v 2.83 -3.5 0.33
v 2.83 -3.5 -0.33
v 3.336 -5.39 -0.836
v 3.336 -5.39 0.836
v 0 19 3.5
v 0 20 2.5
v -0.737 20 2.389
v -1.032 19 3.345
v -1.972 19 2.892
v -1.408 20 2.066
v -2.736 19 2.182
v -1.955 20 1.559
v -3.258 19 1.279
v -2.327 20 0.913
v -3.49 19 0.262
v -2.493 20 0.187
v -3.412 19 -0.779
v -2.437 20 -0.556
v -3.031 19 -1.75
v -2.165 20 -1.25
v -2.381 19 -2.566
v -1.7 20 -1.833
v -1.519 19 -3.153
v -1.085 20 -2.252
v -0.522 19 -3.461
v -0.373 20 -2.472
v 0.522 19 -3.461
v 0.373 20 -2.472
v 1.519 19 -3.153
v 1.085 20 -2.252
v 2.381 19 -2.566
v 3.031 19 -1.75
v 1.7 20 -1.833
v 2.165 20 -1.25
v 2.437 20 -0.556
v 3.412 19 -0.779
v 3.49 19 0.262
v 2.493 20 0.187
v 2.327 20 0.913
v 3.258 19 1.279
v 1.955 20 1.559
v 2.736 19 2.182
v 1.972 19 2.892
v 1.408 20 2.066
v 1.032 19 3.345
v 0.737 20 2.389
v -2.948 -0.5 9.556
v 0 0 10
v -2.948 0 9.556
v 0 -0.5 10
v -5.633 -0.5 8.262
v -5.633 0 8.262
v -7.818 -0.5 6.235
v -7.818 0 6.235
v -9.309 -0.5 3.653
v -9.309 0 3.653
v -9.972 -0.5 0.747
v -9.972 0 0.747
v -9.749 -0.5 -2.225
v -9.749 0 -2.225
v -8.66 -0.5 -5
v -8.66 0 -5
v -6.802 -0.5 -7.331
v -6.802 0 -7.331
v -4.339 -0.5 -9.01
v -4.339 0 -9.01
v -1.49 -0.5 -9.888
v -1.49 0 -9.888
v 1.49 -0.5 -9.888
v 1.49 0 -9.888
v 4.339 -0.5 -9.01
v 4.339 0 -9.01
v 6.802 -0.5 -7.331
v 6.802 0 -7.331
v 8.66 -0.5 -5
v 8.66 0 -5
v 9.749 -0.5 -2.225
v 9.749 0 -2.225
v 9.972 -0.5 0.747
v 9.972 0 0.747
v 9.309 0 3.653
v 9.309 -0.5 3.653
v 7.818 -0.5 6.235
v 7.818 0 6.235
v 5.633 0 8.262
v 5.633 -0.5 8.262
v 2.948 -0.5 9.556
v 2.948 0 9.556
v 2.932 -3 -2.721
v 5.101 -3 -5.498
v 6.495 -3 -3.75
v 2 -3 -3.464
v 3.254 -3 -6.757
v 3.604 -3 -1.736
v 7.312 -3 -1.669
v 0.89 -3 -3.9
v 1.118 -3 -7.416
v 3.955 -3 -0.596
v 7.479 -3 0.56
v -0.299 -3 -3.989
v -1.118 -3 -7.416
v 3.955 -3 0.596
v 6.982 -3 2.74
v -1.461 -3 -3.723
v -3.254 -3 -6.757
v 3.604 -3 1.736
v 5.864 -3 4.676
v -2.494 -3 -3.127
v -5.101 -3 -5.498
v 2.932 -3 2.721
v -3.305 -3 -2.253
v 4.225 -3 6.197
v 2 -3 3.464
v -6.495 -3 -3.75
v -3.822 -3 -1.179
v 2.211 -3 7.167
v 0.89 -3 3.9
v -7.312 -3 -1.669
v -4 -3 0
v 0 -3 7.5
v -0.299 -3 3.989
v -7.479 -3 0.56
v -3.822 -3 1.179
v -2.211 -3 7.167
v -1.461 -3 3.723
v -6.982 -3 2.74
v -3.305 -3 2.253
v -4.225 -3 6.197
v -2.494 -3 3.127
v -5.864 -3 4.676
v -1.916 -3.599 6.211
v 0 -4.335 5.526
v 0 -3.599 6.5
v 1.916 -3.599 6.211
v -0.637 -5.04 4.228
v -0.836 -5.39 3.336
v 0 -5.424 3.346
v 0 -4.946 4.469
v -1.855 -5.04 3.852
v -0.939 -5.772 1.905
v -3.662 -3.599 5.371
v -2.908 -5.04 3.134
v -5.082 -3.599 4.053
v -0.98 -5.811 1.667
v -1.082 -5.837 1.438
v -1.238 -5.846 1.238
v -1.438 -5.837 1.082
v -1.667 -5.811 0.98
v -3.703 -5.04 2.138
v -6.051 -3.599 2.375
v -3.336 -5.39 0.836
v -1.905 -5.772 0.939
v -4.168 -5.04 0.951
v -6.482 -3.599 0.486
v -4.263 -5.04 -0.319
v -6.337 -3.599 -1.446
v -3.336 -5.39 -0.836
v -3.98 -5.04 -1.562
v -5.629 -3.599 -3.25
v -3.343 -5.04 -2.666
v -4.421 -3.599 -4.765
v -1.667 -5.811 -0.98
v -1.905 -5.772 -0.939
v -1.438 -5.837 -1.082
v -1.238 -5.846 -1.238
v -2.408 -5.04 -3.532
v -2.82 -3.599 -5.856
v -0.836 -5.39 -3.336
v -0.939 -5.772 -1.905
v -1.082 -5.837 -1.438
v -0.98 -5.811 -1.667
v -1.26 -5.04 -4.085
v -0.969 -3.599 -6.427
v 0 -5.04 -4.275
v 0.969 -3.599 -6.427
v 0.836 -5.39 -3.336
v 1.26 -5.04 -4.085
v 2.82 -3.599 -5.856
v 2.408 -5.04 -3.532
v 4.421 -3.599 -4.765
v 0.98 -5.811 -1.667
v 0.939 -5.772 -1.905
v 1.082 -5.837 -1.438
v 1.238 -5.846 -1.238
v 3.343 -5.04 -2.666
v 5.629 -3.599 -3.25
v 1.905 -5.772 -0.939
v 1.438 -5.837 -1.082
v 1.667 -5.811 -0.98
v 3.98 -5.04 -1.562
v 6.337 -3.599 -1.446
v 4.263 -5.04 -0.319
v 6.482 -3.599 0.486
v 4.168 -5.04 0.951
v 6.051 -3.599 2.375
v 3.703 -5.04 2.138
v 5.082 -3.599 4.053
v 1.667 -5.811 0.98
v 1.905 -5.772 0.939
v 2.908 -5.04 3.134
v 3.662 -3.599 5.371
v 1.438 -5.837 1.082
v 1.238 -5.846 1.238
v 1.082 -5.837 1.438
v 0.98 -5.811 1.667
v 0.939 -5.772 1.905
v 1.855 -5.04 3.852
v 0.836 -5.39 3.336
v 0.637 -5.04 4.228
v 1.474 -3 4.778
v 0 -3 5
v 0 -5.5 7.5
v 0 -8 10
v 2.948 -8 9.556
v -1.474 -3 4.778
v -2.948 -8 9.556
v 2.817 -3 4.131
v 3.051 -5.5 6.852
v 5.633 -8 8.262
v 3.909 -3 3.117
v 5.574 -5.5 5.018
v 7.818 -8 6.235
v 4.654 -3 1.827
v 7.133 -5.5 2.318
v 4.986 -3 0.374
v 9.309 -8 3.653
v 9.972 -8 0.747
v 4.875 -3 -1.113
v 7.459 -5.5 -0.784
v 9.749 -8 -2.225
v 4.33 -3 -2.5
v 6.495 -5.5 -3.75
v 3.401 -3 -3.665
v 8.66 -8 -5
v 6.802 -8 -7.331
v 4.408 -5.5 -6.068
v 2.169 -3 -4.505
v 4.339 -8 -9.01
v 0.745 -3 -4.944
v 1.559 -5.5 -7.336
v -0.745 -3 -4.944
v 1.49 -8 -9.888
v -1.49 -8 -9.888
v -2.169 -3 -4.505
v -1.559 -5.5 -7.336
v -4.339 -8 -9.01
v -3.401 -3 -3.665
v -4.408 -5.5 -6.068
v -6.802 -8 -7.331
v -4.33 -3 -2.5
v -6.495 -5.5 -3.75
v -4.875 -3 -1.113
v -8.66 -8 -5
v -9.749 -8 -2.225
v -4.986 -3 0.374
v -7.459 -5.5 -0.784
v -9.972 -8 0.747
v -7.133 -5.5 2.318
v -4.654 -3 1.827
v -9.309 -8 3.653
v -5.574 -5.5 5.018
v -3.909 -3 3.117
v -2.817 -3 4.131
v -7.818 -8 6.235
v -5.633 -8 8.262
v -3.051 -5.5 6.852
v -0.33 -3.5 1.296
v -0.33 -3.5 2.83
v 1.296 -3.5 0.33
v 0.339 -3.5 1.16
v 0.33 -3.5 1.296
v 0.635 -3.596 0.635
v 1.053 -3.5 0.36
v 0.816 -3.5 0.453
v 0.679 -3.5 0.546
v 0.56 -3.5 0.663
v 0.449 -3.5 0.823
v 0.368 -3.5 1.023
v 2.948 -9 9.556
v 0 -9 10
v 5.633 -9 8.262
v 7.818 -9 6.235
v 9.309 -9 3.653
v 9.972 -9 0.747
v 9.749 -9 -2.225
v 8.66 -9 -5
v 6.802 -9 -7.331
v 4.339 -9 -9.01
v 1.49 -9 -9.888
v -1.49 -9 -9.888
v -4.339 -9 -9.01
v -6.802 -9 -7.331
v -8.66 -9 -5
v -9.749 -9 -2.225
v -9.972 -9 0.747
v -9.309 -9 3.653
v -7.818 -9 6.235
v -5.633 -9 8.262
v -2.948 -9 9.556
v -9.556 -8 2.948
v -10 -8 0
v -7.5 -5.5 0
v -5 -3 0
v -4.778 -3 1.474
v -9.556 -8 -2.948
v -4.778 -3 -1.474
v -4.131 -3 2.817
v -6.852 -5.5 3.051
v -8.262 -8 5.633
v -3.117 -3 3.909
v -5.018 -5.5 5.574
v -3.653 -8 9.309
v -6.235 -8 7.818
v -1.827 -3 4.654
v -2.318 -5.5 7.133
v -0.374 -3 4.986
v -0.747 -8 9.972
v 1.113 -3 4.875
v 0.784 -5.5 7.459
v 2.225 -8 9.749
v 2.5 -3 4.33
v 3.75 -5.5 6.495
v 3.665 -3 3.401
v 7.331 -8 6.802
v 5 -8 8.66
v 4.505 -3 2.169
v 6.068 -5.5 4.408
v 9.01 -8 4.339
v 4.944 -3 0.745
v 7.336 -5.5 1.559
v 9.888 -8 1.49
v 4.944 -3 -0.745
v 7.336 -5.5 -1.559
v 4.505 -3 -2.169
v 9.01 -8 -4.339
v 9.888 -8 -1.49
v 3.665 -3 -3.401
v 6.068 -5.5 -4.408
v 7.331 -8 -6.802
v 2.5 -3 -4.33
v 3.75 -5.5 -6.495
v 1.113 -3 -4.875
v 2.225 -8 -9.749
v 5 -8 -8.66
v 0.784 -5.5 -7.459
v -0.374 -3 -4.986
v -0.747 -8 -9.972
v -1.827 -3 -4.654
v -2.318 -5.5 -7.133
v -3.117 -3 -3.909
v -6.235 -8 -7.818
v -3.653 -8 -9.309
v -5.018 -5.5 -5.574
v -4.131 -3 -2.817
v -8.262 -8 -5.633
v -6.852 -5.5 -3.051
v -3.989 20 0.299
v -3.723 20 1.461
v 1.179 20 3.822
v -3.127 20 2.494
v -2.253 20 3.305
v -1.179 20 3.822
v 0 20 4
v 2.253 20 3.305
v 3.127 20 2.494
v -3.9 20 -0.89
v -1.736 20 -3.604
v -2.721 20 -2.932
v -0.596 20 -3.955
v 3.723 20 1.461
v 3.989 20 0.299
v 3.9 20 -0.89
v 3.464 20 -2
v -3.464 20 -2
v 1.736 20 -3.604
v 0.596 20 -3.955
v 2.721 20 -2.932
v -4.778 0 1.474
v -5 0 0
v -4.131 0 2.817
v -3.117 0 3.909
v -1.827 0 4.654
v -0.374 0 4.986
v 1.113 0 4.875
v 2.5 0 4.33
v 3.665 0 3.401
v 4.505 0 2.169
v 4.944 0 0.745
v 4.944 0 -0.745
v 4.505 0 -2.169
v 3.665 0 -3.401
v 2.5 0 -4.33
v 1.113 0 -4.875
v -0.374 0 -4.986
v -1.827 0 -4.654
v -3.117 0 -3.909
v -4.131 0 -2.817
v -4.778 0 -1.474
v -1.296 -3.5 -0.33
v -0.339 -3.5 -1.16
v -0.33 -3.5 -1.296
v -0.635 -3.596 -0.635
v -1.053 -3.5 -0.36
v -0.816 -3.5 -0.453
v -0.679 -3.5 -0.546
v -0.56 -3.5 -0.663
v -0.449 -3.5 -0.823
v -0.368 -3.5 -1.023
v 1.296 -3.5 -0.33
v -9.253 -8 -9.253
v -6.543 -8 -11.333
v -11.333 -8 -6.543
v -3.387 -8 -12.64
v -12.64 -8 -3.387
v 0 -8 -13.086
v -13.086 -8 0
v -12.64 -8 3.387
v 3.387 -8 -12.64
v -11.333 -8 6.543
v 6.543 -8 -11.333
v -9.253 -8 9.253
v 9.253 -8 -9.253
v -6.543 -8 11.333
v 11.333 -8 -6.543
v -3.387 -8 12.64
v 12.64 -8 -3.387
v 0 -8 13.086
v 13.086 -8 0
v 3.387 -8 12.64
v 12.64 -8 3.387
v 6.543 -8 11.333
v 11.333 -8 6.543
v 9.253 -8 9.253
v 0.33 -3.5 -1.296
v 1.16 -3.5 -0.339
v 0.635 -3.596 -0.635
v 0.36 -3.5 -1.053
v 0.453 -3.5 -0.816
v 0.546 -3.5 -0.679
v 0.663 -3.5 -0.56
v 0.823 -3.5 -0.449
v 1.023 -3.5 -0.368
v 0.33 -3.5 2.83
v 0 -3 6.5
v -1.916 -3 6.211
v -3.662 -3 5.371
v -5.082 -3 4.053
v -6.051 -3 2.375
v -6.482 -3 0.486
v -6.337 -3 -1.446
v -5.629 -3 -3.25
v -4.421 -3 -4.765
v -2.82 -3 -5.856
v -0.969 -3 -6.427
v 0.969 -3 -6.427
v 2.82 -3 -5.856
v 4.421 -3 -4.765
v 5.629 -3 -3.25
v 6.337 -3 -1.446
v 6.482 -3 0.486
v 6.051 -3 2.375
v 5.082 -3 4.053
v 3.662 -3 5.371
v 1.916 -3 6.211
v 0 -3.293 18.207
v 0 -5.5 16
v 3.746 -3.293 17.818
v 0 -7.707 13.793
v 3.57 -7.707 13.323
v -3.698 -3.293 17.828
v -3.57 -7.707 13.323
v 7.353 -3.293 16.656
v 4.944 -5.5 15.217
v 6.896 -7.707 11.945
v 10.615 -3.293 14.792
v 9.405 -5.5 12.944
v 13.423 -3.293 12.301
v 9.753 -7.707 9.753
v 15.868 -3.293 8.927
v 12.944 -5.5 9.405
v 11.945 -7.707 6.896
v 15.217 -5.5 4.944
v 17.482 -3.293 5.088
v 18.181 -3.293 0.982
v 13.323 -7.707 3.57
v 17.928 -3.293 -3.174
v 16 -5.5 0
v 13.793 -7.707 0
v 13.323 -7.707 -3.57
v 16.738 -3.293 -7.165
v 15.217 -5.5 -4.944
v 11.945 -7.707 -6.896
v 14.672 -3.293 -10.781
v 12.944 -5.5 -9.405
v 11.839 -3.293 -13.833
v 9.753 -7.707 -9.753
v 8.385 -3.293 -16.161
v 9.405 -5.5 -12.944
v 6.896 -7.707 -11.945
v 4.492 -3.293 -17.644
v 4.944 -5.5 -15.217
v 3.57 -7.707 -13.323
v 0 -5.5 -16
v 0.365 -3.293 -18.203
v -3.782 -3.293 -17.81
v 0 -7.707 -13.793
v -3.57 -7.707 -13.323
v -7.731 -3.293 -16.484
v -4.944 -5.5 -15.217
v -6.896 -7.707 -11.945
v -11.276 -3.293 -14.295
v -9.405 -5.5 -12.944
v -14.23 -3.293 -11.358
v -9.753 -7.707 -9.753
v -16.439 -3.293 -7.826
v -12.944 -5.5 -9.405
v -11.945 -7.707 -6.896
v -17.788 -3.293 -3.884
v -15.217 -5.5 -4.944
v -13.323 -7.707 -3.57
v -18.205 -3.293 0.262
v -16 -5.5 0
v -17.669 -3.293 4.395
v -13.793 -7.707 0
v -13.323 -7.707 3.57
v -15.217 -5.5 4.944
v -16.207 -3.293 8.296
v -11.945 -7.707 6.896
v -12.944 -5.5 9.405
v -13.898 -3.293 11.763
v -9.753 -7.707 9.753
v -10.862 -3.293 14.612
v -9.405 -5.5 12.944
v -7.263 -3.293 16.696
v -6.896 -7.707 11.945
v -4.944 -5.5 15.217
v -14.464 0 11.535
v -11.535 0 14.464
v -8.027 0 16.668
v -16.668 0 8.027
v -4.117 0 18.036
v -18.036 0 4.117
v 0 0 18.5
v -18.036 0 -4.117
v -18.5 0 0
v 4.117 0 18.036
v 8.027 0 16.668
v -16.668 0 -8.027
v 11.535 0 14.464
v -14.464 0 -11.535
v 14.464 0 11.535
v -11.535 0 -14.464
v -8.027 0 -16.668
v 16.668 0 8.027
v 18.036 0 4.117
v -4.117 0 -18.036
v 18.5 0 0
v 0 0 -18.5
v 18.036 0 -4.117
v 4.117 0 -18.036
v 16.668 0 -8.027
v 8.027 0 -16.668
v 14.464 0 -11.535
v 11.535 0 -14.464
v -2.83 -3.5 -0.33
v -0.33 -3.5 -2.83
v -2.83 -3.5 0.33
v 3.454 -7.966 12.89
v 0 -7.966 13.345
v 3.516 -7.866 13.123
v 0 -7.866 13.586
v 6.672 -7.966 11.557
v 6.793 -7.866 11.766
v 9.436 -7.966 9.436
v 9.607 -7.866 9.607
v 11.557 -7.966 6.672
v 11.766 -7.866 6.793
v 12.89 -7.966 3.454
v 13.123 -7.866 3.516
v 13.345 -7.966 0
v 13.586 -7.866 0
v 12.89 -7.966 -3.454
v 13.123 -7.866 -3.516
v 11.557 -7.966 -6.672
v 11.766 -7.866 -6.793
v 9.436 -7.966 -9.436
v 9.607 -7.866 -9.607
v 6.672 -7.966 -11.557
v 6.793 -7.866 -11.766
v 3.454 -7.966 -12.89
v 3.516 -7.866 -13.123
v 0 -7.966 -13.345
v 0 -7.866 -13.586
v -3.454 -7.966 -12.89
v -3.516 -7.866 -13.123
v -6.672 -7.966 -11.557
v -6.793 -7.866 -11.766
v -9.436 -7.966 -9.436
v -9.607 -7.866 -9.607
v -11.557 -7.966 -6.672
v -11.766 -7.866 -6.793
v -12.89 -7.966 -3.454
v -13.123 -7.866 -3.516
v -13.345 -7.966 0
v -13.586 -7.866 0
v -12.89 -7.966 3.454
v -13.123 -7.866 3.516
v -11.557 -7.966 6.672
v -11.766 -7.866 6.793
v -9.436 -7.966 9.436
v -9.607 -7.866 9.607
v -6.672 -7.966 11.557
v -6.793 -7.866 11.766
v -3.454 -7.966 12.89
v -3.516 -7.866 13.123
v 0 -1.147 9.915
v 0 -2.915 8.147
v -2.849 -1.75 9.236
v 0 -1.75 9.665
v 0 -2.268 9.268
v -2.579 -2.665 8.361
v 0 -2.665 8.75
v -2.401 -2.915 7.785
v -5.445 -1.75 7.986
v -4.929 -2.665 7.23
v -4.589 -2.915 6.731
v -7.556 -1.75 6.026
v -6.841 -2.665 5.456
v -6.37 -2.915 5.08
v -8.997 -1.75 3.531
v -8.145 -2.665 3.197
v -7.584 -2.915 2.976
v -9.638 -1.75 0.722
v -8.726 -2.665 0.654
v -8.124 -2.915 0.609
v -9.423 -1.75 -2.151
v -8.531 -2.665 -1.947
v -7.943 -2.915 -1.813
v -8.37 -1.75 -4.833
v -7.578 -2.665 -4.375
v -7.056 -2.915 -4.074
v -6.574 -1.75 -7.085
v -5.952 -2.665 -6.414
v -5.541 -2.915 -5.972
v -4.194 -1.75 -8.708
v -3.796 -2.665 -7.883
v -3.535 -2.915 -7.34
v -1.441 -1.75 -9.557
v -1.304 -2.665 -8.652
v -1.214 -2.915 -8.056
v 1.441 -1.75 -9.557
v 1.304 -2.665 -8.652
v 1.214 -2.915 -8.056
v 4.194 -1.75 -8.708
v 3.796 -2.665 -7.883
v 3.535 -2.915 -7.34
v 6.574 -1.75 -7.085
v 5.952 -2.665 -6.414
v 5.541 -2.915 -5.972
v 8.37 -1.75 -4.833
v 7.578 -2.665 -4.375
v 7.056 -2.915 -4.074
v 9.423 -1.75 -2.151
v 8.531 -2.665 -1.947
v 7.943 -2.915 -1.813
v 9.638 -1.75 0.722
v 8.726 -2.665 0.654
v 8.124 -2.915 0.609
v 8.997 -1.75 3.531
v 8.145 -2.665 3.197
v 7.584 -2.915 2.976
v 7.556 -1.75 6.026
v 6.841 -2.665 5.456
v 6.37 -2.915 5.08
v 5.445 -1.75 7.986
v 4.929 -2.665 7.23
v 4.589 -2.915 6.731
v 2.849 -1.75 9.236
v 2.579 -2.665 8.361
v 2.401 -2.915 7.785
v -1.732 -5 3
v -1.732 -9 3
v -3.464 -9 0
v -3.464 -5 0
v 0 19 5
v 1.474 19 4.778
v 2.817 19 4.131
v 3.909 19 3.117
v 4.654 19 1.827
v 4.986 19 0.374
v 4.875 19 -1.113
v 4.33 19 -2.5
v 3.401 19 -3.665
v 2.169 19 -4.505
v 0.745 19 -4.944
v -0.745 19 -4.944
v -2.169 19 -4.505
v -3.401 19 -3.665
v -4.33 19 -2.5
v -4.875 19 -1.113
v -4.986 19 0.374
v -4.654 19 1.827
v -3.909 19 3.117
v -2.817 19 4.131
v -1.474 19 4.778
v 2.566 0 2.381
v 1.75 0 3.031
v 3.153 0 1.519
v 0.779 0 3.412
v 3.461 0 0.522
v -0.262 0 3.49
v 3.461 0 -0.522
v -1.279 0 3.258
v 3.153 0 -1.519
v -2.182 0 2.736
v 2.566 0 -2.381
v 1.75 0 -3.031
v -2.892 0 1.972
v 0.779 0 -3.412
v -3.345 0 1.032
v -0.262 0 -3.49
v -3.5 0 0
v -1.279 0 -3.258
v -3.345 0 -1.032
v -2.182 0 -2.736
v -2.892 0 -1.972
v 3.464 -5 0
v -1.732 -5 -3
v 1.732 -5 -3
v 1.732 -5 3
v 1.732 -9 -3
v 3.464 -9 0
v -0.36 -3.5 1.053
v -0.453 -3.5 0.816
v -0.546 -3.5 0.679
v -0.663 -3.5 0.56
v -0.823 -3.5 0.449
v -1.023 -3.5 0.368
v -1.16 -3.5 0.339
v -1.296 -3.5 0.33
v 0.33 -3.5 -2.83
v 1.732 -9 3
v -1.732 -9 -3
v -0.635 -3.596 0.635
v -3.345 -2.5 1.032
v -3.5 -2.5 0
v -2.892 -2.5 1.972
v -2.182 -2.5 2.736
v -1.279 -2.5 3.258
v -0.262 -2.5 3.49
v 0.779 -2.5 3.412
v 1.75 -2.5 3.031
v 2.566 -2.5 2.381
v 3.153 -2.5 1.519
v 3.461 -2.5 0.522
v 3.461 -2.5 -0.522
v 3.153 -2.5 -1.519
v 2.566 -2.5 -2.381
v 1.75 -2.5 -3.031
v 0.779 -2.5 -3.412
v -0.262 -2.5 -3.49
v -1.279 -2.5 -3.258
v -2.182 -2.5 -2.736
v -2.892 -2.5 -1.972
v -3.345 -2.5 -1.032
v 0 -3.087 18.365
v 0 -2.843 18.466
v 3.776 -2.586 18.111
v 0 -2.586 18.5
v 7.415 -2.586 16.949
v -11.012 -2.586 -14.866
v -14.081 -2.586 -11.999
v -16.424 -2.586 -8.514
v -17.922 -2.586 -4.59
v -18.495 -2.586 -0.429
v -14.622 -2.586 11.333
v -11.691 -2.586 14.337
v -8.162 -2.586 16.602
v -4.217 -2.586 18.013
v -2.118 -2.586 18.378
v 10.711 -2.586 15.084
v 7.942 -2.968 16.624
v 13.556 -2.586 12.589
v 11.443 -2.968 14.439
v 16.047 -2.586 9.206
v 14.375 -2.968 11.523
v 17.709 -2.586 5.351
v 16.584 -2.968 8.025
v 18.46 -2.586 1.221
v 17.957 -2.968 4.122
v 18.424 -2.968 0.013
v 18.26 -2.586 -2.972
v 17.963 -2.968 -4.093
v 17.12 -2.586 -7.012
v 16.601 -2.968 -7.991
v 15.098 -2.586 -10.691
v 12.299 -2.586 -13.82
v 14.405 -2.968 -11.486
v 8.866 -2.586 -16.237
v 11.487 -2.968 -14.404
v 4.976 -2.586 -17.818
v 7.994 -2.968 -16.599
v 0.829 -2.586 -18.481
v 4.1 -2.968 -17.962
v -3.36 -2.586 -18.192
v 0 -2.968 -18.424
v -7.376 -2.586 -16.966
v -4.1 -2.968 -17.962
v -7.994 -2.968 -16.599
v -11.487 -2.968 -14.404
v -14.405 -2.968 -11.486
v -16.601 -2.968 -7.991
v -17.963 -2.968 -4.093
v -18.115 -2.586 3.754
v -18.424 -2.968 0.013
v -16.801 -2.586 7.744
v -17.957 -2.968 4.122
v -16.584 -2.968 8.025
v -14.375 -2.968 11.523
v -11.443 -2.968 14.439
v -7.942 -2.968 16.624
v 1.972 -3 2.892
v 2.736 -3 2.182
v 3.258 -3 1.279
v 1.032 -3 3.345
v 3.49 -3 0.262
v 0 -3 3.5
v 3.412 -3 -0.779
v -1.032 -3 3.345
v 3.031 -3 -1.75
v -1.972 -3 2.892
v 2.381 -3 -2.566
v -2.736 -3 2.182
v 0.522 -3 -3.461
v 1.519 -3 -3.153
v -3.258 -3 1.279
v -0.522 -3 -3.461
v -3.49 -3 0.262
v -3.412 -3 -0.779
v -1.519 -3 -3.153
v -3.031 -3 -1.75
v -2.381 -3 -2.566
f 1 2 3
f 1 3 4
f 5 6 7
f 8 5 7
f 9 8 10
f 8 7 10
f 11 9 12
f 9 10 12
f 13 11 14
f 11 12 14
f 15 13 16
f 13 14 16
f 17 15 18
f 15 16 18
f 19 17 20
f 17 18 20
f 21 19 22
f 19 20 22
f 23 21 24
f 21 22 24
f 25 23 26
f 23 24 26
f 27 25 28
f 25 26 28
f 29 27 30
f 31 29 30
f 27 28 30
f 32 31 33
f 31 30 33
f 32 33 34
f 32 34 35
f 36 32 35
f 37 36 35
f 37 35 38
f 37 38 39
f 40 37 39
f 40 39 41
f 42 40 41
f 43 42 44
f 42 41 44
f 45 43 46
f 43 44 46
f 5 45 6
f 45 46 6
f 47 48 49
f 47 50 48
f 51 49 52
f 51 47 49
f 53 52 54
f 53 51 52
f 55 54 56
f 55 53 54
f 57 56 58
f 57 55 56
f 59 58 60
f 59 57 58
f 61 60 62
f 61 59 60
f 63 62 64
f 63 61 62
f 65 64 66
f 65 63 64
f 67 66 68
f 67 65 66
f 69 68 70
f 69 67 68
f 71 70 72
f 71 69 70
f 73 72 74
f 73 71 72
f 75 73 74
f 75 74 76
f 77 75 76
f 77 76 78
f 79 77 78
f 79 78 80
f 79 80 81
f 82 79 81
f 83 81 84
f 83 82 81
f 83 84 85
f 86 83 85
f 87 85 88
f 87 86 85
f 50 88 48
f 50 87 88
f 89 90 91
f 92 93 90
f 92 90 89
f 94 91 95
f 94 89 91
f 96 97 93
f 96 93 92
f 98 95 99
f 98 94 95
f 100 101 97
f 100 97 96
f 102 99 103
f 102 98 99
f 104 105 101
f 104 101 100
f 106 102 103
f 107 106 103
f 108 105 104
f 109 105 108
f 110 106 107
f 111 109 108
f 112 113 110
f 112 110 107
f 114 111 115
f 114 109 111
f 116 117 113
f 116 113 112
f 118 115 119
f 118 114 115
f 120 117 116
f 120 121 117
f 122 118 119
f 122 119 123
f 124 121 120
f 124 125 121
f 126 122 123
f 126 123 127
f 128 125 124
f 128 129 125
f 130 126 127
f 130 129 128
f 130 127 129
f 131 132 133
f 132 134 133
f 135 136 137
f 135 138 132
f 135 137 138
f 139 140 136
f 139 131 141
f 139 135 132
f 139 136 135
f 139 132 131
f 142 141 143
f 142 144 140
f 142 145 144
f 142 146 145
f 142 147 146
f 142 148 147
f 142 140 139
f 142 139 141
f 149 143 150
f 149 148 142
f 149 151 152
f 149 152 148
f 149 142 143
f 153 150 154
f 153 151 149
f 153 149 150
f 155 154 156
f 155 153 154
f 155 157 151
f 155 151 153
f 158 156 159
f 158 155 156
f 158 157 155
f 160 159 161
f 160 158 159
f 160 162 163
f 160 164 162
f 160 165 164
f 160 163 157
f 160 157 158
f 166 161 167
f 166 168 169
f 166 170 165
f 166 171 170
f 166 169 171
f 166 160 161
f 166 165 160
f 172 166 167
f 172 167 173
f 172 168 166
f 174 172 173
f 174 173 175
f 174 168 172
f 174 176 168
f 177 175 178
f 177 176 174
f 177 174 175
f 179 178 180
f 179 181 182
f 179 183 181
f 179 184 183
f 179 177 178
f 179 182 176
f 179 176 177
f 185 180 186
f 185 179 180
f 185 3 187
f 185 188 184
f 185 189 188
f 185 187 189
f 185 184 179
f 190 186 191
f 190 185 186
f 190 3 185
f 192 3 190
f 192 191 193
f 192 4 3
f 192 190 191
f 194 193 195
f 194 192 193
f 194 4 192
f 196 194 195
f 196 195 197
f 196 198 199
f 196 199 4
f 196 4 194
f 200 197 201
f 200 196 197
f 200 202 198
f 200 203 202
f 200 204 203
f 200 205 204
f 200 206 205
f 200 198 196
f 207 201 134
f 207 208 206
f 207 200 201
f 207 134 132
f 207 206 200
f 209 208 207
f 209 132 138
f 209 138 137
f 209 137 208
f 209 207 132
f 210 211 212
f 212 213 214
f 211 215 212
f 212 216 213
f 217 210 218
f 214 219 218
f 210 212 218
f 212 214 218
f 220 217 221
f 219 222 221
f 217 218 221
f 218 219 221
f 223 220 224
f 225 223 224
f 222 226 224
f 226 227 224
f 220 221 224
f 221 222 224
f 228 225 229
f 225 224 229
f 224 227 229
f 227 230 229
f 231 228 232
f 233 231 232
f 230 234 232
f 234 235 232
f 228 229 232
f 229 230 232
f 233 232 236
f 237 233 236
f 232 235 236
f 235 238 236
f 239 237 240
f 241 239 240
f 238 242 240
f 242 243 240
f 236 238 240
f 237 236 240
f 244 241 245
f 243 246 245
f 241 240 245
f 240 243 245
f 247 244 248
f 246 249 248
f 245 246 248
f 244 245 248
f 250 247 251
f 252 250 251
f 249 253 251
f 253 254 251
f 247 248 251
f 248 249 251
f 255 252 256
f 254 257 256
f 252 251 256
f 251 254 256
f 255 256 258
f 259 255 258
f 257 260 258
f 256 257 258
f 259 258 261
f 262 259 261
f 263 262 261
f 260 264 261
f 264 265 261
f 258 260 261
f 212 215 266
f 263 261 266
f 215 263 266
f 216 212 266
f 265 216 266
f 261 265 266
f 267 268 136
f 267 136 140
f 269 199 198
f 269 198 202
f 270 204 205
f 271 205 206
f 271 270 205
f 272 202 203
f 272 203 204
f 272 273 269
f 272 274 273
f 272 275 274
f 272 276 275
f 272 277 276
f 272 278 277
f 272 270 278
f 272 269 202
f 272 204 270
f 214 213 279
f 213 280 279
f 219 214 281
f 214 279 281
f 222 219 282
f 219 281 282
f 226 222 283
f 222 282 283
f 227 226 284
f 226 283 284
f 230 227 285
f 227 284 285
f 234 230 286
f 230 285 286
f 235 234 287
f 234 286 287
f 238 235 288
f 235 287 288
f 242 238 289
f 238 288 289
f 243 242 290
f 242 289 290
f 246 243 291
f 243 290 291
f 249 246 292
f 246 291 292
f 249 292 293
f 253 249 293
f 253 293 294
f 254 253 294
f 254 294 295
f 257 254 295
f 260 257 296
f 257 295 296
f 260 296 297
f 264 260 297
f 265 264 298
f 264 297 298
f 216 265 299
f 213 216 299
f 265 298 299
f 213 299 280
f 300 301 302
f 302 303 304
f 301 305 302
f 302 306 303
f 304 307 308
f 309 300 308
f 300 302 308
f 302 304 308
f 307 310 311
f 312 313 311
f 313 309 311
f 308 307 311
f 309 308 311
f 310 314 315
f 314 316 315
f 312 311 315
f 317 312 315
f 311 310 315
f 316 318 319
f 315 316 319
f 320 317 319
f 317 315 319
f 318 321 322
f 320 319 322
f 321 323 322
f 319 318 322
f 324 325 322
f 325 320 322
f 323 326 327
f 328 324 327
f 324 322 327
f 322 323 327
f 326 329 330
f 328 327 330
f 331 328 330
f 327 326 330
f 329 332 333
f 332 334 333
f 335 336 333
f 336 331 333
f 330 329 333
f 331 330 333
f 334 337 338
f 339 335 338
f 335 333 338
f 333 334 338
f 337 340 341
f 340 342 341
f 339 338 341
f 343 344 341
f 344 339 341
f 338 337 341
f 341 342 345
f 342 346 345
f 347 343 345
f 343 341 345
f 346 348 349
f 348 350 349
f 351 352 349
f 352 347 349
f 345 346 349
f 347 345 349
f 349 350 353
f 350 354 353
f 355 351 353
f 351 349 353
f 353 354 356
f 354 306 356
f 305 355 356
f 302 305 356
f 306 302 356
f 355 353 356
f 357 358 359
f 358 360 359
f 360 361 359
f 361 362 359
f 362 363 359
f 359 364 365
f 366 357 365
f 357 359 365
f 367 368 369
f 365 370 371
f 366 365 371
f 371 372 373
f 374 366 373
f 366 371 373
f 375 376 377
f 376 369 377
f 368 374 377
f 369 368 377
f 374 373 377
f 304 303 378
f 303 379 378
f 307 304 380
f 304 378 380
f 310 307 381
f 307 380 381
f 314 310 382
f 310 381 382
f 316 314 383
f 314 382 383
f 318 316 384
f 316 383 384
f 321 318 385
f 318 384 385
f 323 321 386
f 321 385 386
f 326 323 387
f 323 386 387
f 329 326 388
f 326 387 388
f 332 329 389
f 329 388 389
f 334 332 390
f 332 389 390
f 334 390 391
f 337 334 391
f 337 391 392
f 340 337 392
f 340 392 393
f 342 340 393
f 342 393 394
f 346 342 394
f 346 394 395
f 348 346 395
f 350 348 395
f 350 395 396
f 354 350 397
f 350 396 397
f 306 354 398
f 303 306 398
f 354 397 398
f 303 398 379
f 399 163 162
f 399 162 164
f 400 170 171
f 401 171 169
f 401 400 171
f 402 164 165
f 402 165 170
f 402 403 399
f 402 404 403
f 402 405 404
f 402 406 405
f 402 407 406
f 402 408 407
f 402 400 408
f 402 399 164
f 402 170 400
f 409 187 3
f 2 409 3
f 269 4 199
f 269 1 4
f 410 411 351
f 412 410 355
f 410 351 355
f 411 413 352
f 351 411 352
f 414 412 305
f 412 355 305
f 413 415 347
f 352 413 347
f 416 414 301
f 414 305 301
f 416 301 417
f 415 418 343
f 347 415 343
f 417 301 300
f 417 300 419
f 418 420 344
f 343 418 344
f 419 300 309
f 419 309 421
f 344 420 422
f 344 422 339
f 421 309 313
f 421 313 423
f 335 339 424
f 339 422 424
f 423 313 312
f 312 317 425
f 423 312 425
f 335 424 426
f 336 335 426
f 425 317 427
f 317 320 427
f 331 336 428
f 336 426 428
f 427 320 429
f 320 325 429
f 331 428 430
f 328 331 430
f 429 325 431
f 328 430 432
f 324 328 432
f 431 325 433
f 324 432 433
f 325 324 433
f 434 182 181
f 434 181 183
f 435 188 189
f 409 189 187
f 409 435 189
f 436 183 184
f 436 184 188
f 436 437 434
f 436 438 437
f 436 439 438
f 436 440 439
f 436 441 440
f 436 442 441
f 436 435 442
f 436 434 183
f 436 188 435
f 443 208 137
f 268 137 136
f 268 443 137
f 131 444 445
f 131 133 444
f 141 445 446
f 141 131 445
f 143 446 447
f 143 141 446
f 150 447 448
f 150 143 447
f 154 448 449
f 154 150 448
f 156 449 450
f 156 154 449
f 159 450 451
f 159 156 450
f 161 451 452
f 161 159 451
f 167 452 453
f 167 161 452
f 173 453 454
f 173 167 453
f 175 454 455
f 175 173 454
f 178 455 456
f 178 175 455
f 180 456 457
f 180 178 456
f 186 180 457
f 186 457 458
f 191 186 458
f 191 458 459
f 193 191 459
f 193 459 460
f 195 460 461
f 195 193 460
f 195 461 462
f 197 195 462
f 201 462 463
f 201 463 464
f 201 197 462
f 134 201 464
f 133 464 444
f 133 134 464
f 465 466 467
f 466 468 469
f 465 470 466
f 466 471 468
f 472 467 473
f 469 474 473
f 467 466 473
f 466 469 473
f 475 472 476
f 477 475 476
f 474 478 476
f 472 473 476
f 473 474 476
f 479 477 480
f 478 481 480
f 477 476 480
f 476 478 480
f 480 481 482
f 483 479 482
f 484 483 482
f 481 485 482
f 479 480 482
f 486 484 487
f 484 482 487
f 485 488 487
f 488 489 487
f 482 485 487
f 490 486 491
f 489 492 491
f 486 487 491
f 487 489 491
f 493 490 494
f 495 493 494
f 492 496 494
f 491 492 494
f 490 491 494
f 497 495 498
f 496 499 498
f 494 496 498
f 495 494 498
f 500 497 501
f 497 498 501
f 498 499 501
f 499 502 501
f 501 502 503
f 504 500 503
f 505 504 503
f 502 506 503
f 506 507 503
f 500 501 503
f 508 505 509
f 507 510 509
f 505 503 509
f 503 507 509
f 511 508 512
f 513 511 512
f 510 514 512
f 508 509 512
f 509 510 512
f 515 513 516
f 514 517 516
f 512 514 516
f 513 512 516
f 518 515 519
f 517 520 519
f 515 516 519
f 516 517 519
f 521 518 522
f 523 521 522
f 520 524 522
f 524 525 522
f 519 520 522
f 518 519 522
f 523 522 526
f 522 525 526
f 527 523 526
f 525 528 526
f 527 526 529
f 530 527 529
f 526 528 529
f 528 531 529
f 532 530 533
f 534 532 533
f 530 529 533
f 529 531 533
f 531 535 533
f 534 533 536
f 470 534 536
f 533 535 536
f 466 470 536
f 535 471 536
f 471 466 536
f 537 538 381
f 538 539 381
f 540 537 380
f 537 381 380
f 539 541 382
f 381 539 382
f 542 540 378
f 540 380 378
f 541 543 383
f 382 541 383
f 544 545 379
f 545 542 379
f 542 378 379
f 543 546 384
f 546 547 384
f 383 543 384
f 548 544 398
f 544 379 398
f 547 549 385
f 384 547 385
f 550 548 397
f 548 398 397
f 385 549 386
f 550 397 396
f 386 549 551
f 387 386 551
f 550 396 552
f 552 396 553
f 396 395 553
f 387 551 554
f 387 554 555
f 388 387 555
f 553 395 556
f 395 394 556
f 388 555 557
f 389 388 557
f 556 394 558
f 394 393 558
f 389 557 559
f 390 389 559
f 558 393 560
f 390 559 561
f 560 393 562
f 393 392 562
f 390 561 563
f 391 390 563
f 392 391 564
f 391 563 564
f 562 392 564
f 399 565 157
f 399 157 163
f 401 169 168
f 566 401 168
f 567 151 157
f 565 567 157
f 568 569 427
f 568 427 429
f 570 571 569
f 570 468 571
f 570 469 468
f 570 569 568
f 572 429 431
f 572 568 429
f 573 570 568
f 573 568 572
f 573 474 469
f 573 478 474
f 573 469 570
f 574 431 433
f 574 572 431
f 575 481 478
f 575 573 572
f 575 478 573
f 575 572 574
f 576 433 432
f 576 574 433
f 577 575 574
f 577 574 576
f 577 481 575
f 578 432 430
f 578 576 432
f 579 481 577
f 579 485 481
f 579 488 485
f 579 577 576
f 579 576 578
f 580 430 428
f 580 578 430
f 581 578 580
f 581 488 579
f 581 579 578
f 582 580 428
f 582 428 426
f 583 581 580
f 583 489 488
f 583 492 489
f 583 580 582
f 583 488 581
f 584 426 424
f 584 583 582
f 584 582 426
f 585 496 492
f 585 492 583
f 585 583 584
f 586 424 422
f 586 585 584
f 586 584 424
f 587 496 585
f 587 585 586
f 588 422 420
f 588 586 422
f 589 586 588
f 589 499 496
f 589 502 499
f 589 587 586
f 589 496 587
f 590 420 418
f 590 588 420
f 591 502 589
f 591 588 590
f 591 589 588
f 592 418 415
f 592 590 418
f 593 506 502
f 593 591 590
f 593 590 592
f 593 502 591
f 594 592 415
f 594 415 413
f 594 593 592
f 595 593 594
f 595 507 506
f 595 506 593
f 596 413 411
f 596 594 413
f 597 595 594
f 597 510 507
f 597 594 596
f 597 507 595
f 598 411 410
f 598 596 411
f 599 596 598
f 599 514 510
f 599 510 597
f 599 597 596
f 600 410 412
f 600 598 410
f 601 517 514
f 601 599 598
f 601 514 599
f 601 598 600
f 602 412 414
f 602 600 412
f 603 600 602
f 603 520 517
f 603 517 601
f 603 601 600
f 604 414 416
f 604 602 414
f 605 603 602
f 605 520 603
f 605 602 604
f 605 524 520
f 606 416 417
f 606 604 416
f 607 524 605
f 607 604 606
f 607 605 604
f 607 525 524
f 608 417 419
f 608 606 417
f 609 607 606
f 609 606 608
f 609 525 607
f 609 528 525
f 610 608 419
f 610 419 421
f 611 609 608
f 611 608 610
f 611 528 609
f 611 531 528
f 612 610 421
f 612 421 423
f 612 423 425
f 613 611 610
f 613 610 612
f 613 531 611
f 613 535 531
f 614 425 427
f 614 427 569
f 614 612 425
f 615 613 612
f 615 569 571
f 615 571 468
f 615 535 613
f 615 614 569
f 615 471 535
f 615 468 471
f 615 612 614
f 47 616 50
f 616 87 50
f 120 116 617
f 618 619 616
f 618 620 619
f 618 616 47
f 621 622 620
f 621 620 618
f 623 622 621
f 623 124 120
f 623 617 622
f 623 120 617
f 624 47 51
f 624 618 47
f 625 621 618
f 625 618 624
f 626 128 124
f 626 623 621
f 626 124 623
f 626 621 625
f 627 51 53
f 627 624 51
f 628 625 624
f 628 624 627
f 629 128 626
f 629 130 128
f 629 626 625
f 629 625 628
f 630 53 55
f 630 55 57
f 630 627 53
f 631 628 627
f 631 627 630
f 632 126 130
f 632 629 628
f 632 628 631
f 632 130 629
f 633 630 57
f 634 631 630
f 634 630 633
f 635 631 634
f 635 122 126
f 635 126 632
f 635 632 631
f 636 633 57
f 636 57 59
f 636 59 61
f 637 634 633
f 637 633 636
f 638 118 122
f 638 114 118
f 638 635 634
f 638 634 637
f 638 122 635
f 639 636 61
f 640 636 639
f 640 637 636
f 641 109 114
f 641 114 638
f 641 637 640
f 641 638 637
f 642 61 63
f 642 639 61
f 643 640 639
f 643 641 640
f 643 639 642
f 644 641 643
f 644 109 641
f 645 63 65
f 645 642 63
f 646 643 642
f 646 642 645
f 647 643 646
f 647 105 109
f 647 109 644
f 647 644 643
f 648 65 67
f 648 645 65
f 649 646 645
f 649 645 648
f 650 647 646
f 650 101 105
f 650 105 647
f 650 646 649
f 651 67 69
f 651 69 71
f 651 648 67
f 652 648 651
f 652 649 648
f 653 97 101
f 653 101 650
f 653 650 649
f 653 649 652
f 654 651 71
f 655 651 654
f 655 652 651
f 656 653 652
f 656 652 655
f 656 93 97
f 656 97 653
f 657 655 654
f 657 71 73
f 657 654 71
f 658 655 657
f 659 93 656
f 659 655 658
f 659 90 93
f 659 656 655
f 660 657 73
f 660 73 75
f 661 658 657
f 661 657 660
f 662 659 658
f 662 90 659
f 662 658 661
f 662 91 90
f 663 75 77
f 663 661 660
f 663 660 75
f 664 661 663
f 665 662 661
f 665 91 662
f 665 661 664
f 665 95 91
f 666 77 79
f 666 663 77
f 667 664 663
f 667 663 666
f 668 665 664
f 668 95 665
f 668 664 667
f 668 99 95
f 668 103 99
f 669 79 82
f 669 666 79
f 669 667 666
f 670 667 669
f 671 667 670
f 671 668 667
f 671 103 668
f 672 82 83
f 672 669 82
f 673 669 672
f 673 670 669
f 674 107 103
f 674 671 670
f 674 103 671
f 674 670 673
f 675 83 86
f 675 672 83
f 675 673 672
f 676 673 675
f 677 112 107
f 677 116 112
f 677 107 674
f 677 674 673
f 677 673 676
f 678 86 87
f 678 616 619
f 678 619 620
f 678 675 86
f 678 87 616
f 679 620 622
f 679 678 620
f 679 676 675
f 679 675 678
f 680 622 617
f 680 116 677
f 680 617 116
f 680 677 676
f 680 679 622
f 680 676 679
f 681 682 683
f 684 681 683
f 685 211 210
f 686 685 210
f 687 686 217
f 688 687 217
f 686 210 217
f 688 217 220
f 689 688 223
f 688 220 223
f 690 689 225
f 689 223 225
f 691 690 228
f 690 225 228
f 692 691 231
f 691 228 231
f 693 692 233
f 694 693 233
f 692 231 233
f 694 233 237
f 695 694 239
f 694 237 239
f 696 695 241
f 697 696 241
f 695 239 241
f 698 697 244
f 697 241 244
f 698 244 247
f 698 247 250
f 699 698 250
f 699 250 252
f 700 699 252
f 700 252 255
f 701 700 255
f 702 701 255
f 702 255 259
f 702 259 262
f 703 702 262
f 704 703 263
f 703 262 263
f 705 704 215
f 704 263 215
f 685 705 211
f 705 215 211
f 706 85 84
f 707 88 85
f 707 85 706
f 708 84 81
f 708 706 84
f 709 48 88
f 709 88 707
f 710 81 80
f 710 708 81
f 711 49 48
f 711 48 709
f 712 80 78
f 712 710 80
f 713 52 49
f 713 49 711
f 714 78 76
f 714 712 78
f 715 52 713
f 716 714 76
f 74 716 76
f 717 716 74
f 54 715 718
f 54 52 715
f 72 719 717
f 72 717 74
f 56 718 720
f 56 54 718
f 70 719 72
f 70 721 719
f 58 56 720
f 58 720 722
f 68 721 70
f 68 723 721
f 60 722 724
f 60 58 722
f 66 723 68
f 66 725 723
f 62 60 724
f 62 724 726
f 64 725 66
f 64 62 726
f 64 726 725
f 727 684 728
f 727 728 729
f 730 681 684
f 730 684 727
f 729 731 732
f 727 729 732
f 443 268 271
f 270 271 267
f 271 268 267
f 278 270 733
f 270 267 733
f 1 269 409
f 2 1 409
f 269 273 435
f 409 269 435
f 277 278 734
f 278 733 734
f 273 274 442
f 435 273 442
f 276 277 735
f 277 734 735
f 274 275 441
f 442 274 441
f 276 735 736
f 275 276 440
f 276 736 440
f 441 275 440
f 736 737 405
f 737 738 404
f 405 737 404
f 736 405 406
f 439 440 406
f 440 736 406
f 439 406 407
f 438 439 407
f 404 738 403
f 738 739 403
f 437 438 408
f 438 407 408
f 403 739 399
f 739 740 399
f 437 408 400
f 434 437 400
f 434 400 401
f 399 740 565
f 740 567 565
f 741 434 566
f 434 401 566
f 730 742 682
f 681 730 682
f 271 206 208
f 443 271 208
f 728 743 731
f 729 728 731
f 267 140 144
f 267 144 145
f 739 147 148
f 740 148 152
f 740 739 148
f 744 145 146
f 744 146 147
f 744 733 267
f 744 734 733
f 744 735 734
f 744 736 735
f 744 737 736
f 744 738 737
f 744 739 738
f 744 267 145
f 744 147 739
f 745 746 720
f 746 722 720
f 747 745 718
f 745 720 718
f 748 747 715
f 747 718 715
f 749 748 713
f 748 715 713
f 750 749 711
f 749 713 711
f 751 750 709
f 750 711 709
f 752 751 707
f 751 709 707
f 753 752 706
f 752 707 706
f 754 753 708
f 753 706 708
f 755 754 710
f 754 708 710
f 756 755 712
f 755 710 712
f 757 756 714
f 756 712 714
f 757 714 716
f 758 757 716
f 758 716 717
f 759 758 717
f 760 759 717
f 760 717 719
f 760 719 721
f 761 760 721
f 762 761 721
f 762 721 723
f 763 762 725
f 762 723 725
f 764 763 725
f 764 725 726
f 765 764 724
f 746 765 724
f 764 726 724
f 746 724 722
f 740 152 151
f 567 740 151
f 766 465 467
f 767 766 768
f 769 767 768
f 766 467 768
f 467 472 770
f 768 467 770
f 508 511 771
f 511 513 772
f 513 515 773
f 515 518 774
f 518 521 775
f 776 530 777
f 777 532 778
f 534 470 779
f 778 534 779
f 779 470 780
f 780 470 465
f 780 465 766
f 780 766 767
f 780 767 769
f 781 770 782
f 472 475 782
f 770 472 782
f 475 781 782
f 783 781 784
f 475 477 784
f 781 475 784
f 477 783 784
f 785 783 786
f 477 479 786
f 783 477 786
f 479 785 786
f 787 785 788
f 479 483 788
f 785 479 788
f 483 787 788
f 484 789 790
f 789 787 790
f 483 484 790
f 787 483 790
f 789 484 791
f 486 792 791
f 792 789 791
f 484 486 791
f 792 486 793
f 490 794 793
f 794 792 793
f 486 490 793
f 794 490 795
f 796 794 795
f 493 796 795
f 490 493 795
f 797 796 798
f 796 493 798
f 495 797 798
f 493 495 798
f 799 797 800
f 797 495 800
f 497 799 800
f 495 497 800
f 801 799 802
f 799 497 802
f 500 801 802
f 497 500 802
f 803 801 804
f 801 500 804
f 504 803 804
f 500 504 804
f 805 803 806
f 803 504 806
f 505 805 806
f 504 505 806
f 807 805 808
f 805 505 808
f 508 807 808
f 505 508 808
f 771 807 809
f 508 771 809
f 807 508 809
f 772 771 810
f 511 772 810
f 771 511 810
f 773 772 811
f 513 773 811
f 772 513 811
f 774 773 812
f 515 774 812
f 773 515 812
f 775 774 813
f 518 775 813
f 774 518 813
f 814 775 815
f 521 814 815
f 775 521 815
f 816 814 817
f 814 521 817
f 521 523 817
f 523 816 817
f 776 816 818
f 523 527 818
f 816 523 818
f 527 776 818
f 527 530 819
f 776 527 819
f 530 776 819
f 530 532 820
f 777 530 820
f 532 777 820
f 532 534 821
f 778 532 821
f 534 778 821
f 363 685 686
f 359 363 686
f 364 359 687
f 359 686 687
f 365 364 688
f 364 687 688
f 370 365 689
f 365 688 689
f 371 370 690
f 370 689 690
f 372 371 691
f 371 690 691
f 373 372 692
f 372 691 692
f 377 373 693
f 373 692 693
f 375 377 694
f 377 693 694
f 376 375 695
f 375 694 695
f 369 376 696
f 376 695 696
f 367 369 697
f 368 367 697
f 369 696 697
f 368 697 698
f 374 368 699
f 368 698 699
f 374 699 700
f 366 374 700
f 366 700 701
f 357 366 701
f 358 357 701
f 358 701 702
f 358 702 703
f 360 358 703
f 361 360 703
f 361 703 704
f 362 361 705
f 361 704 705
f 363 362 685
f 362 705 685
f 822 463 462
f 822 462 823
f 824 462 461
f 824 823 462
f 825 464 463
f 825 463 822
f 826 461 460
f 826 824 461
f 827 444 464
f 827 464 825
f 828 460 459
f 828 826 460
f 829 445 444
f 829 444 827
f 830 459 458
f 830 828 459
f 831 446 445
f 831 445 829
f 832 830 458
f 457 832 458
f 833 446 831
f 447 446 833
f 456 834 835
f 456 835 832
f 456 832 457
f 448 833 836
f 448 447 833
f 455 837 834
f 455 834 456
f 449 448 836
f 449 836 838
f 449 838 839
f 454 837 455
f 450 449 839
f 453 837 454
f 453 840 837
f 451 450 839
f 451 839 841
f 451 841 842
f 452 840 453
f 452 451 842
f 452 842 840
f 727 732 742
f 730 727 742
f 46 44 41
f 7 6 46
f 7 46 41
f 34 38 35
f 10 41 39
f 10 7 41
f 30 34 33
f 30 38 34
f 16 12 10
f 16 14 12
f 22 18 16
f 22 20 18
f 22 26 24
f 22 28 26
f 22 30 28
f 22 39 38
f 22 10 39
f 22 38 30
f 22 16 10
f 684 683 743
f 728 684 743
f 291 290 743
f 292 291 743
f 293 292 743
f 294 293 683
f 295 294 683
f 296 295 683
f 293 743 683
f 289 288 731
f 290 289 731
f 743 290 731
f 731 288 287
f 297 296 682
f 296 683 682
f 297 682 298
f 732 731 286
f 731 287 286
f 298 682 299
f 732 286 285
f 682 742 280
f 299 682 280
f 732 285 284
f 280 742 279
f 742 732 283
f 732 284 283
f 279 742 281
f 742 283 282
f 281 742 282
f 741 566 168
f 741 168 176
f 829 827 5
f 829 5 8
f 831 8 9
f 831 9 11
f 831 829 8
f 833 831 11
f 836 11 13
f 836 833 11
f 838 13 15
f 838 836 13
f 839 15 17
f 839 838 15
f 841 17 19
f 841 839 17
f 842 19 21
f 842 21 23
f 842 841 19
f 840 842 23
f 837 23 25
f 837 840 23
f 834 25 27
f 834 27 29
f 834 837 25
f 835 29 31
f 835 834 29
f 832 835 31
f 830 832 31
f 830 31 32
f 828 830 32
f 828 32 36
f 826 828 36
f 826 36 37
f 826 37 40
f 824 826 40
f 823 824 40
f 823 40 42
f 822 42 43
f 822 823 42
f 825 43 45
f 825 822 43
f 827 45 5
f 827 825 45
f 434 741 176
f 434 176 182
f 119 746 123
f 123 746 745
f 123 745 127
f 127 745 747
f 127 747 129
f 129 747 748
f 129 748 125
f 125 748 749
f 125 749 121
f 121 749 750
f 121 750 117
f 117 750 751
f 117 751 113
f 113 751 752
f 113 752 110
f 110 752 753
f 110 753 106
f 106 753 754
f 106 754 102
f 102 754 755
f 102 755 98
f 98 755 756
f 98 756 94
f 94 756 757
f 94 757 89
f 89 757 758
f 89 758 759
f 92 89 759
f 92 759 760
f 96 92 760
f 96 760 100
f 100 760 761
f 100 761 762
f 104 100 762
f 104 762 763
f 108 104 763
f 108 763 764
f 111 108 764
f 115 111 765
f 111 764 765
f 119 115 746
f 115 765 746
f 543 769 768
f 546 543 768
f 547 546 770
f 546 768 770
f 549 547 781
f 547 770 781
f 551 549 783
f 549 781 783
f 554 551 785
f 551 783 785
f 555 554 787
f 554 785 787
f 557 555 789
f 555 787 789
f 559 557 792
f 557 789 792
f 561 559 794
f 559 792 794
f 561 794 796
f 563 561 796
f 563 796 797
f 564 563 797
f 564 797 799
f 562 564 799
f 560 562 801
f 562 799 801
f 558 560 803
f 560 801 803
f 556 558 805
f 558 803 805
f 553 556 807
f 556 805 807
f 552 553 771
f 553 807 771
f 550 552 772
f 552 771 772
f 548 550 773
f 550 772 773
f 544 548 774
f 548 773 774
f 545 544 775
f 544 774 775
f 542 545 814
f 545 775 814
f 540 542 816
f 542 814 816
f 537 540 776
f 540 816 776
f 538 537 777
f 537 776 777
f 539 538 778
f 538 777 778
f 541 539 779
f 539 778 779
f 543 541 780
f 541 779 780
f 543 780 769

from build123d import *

# Parameters (mm, degrees)
F5_D           = 7
F5_CSINK_D     = 8
F5_CSINK_ANGLE = 90
F9_D           = 10
F9_CSINK_D     = 20
F9_CSINK_ANGLE = 90
F10_R          = 1
F15_W          = 2
F15_H          = 2.5
F15_W_2        = 2.5
F15_H_2        = 2
F16_DEPTH      = 2.5
F16_TAPER      = 15
F17_R          = 1
F21_DEPTH      = 4
F22_SIZE       = 1
F22_2_SIZE     = 1


with BuildPart() as f3:
    # F2 (on Right) → F3 (revolve)
    with BuildSketch(Plane.YZ):
        with BuildLine():
            Line((-3, 0), (0, 0))
            Line((0, 0), (0, 10))
            Line((0, 10), (-0.5, 10))
            ThreePointArc((-0.5, 10), (-2.267766953, 9.267766953), (-3, 7.5))
            Line((-3, 7.5), (-3, 0))
        make_face()
    revolve(axis=Axis((0, -1.5, 0), (0, -1, 0)))

    # F5 (through all)
    with Locations(Plane.XZ.offset(3)):
        with Locations((0, 0)):
            CounterSinkHole(F5_D / 2, F5_CSINK_D / 2, counter_sink_angle=F5_CSINK_ANGLE)


with BuildPart() as f7:
    # F6 (on Right) → F7 (revolve)
    with BuildSketch(Plane.YZ):
        Polygon((-8, 0), (0, 0), (0, 18.5), (-3, 18.5), (-8, 13.5), align=None)
    revolve(axis=Axis((0, -4, 0), (0, 1, 0)))

    # F9 (through all)
    with Locations(Plane.XZ.offset(8)):
        with Locations((0, 0)):
            CounterSinkHole(F9_D / 2, F9_CSINK_D / 2, counter_sink_angle=F9_CSINK_ANGLE)

    # F10
    f10_edges = [f7.edges().sort_by_distance(p)[0] for p in [
        (0, -3, -18.5),
        (0, -8, -13.5),
        (0, -5.5, 16),
    ]]
    fillet(f10_edges, radius=F10_R)


with BuildPart() as f13:
    # F12 (on Right) → F13 (revolve)
    with BuildSketch(Plane.YZ):
        with BuildLine():
            Line((20, 0), (20, 3.5))
            Line((20, 3.5), (-3, 3.5))
            Line((-3, 3.5), (-3, 6.5))
            Line((-3, 6.5), (-3.5993420768, 6.5))
            ThreePointArc((-3.5993420768, 6.5), (-5.3806561809, 3.4645763978), (-6, 0))
            Line((-6, 0), (20, 0))
        make_face()
    revolve(axis=Axis((0, 7, 0), (0, -1, 0)))

    # F15 (on plane+point) → F16 (cut)
    with BuildSketch(Plane.XZ.offset(6)):
        with Locations((0, 2.25)):
            Rectangle(F15_W, F15_H)
        with Locations((2.25, 0)):
            Rectangle(F15_W_2, F15_H_2)
        Rectangle(F15_W, F15_H_2)
        with Locations((-2.25, 0)):
            Rectangle(F15_W_2, F15_H_2)
        with Locations((0, -2.25)):
            Rectangle(F15_W, F15_H)
    extrude(amount=-F16_DEPTH, taper=F16_TAPER, mode=Mode.SUBTRACT)

    # F17
    f17_edges = [f13.edges().sort_by_distance(p)[0] for p in [
        (-0.652281, -4.702296, 0.652281),
        (0.652281, -4.702296, 0.652281),
        (0.652281, -4.702296, -0.652281),
        (-0.652281, -4.702296, -0.652281),
    ]]
    fillet(f17_edges, radius=F17_R)

    # F22
    f22_edges = [f13.edges().sort_by_distance(p)[0] for p in [
        (0, 20, -3.5),
    ]]
    chamfer(f22_edges, length=F22_SIZE)


with BuildPart() as f19:
    # F18 (on Right) → F19 (revolve)
    with BuildSketch(Plane.YZ):
        Polygon((20, 0), (20, 5), (-3, 5), (-8, 10), (-9, 10), (-9, 0), align=None)
    revolve(axis=Axis((0, 5.5, 0), (0, 1, 0)))

    # F20 (on face) → F21 (cut)
    with BuildSketch(Plane.XZ.offset(9)):
        Polygon((1.7320508076, 3), (-1.7320508076, 3), (-3.4641016151, 0), (-1.7320508076, -3), (1.7320508076, -3), (3.4641016151, 0), align=None)
    extrude(amount=-F21_DEPTH, mode=Mode.SUBTRACT)

    # F22#2
    f22_2_edges = [f19.edges().sort_by_distance(p)[0] for p in [
        (0, 20, -5),
    ]]
    chamfer(f22_2_edges, length=F22_2_SIZE)


solid = Compound([f3.part, f7.part, f13.part, f19.part])
